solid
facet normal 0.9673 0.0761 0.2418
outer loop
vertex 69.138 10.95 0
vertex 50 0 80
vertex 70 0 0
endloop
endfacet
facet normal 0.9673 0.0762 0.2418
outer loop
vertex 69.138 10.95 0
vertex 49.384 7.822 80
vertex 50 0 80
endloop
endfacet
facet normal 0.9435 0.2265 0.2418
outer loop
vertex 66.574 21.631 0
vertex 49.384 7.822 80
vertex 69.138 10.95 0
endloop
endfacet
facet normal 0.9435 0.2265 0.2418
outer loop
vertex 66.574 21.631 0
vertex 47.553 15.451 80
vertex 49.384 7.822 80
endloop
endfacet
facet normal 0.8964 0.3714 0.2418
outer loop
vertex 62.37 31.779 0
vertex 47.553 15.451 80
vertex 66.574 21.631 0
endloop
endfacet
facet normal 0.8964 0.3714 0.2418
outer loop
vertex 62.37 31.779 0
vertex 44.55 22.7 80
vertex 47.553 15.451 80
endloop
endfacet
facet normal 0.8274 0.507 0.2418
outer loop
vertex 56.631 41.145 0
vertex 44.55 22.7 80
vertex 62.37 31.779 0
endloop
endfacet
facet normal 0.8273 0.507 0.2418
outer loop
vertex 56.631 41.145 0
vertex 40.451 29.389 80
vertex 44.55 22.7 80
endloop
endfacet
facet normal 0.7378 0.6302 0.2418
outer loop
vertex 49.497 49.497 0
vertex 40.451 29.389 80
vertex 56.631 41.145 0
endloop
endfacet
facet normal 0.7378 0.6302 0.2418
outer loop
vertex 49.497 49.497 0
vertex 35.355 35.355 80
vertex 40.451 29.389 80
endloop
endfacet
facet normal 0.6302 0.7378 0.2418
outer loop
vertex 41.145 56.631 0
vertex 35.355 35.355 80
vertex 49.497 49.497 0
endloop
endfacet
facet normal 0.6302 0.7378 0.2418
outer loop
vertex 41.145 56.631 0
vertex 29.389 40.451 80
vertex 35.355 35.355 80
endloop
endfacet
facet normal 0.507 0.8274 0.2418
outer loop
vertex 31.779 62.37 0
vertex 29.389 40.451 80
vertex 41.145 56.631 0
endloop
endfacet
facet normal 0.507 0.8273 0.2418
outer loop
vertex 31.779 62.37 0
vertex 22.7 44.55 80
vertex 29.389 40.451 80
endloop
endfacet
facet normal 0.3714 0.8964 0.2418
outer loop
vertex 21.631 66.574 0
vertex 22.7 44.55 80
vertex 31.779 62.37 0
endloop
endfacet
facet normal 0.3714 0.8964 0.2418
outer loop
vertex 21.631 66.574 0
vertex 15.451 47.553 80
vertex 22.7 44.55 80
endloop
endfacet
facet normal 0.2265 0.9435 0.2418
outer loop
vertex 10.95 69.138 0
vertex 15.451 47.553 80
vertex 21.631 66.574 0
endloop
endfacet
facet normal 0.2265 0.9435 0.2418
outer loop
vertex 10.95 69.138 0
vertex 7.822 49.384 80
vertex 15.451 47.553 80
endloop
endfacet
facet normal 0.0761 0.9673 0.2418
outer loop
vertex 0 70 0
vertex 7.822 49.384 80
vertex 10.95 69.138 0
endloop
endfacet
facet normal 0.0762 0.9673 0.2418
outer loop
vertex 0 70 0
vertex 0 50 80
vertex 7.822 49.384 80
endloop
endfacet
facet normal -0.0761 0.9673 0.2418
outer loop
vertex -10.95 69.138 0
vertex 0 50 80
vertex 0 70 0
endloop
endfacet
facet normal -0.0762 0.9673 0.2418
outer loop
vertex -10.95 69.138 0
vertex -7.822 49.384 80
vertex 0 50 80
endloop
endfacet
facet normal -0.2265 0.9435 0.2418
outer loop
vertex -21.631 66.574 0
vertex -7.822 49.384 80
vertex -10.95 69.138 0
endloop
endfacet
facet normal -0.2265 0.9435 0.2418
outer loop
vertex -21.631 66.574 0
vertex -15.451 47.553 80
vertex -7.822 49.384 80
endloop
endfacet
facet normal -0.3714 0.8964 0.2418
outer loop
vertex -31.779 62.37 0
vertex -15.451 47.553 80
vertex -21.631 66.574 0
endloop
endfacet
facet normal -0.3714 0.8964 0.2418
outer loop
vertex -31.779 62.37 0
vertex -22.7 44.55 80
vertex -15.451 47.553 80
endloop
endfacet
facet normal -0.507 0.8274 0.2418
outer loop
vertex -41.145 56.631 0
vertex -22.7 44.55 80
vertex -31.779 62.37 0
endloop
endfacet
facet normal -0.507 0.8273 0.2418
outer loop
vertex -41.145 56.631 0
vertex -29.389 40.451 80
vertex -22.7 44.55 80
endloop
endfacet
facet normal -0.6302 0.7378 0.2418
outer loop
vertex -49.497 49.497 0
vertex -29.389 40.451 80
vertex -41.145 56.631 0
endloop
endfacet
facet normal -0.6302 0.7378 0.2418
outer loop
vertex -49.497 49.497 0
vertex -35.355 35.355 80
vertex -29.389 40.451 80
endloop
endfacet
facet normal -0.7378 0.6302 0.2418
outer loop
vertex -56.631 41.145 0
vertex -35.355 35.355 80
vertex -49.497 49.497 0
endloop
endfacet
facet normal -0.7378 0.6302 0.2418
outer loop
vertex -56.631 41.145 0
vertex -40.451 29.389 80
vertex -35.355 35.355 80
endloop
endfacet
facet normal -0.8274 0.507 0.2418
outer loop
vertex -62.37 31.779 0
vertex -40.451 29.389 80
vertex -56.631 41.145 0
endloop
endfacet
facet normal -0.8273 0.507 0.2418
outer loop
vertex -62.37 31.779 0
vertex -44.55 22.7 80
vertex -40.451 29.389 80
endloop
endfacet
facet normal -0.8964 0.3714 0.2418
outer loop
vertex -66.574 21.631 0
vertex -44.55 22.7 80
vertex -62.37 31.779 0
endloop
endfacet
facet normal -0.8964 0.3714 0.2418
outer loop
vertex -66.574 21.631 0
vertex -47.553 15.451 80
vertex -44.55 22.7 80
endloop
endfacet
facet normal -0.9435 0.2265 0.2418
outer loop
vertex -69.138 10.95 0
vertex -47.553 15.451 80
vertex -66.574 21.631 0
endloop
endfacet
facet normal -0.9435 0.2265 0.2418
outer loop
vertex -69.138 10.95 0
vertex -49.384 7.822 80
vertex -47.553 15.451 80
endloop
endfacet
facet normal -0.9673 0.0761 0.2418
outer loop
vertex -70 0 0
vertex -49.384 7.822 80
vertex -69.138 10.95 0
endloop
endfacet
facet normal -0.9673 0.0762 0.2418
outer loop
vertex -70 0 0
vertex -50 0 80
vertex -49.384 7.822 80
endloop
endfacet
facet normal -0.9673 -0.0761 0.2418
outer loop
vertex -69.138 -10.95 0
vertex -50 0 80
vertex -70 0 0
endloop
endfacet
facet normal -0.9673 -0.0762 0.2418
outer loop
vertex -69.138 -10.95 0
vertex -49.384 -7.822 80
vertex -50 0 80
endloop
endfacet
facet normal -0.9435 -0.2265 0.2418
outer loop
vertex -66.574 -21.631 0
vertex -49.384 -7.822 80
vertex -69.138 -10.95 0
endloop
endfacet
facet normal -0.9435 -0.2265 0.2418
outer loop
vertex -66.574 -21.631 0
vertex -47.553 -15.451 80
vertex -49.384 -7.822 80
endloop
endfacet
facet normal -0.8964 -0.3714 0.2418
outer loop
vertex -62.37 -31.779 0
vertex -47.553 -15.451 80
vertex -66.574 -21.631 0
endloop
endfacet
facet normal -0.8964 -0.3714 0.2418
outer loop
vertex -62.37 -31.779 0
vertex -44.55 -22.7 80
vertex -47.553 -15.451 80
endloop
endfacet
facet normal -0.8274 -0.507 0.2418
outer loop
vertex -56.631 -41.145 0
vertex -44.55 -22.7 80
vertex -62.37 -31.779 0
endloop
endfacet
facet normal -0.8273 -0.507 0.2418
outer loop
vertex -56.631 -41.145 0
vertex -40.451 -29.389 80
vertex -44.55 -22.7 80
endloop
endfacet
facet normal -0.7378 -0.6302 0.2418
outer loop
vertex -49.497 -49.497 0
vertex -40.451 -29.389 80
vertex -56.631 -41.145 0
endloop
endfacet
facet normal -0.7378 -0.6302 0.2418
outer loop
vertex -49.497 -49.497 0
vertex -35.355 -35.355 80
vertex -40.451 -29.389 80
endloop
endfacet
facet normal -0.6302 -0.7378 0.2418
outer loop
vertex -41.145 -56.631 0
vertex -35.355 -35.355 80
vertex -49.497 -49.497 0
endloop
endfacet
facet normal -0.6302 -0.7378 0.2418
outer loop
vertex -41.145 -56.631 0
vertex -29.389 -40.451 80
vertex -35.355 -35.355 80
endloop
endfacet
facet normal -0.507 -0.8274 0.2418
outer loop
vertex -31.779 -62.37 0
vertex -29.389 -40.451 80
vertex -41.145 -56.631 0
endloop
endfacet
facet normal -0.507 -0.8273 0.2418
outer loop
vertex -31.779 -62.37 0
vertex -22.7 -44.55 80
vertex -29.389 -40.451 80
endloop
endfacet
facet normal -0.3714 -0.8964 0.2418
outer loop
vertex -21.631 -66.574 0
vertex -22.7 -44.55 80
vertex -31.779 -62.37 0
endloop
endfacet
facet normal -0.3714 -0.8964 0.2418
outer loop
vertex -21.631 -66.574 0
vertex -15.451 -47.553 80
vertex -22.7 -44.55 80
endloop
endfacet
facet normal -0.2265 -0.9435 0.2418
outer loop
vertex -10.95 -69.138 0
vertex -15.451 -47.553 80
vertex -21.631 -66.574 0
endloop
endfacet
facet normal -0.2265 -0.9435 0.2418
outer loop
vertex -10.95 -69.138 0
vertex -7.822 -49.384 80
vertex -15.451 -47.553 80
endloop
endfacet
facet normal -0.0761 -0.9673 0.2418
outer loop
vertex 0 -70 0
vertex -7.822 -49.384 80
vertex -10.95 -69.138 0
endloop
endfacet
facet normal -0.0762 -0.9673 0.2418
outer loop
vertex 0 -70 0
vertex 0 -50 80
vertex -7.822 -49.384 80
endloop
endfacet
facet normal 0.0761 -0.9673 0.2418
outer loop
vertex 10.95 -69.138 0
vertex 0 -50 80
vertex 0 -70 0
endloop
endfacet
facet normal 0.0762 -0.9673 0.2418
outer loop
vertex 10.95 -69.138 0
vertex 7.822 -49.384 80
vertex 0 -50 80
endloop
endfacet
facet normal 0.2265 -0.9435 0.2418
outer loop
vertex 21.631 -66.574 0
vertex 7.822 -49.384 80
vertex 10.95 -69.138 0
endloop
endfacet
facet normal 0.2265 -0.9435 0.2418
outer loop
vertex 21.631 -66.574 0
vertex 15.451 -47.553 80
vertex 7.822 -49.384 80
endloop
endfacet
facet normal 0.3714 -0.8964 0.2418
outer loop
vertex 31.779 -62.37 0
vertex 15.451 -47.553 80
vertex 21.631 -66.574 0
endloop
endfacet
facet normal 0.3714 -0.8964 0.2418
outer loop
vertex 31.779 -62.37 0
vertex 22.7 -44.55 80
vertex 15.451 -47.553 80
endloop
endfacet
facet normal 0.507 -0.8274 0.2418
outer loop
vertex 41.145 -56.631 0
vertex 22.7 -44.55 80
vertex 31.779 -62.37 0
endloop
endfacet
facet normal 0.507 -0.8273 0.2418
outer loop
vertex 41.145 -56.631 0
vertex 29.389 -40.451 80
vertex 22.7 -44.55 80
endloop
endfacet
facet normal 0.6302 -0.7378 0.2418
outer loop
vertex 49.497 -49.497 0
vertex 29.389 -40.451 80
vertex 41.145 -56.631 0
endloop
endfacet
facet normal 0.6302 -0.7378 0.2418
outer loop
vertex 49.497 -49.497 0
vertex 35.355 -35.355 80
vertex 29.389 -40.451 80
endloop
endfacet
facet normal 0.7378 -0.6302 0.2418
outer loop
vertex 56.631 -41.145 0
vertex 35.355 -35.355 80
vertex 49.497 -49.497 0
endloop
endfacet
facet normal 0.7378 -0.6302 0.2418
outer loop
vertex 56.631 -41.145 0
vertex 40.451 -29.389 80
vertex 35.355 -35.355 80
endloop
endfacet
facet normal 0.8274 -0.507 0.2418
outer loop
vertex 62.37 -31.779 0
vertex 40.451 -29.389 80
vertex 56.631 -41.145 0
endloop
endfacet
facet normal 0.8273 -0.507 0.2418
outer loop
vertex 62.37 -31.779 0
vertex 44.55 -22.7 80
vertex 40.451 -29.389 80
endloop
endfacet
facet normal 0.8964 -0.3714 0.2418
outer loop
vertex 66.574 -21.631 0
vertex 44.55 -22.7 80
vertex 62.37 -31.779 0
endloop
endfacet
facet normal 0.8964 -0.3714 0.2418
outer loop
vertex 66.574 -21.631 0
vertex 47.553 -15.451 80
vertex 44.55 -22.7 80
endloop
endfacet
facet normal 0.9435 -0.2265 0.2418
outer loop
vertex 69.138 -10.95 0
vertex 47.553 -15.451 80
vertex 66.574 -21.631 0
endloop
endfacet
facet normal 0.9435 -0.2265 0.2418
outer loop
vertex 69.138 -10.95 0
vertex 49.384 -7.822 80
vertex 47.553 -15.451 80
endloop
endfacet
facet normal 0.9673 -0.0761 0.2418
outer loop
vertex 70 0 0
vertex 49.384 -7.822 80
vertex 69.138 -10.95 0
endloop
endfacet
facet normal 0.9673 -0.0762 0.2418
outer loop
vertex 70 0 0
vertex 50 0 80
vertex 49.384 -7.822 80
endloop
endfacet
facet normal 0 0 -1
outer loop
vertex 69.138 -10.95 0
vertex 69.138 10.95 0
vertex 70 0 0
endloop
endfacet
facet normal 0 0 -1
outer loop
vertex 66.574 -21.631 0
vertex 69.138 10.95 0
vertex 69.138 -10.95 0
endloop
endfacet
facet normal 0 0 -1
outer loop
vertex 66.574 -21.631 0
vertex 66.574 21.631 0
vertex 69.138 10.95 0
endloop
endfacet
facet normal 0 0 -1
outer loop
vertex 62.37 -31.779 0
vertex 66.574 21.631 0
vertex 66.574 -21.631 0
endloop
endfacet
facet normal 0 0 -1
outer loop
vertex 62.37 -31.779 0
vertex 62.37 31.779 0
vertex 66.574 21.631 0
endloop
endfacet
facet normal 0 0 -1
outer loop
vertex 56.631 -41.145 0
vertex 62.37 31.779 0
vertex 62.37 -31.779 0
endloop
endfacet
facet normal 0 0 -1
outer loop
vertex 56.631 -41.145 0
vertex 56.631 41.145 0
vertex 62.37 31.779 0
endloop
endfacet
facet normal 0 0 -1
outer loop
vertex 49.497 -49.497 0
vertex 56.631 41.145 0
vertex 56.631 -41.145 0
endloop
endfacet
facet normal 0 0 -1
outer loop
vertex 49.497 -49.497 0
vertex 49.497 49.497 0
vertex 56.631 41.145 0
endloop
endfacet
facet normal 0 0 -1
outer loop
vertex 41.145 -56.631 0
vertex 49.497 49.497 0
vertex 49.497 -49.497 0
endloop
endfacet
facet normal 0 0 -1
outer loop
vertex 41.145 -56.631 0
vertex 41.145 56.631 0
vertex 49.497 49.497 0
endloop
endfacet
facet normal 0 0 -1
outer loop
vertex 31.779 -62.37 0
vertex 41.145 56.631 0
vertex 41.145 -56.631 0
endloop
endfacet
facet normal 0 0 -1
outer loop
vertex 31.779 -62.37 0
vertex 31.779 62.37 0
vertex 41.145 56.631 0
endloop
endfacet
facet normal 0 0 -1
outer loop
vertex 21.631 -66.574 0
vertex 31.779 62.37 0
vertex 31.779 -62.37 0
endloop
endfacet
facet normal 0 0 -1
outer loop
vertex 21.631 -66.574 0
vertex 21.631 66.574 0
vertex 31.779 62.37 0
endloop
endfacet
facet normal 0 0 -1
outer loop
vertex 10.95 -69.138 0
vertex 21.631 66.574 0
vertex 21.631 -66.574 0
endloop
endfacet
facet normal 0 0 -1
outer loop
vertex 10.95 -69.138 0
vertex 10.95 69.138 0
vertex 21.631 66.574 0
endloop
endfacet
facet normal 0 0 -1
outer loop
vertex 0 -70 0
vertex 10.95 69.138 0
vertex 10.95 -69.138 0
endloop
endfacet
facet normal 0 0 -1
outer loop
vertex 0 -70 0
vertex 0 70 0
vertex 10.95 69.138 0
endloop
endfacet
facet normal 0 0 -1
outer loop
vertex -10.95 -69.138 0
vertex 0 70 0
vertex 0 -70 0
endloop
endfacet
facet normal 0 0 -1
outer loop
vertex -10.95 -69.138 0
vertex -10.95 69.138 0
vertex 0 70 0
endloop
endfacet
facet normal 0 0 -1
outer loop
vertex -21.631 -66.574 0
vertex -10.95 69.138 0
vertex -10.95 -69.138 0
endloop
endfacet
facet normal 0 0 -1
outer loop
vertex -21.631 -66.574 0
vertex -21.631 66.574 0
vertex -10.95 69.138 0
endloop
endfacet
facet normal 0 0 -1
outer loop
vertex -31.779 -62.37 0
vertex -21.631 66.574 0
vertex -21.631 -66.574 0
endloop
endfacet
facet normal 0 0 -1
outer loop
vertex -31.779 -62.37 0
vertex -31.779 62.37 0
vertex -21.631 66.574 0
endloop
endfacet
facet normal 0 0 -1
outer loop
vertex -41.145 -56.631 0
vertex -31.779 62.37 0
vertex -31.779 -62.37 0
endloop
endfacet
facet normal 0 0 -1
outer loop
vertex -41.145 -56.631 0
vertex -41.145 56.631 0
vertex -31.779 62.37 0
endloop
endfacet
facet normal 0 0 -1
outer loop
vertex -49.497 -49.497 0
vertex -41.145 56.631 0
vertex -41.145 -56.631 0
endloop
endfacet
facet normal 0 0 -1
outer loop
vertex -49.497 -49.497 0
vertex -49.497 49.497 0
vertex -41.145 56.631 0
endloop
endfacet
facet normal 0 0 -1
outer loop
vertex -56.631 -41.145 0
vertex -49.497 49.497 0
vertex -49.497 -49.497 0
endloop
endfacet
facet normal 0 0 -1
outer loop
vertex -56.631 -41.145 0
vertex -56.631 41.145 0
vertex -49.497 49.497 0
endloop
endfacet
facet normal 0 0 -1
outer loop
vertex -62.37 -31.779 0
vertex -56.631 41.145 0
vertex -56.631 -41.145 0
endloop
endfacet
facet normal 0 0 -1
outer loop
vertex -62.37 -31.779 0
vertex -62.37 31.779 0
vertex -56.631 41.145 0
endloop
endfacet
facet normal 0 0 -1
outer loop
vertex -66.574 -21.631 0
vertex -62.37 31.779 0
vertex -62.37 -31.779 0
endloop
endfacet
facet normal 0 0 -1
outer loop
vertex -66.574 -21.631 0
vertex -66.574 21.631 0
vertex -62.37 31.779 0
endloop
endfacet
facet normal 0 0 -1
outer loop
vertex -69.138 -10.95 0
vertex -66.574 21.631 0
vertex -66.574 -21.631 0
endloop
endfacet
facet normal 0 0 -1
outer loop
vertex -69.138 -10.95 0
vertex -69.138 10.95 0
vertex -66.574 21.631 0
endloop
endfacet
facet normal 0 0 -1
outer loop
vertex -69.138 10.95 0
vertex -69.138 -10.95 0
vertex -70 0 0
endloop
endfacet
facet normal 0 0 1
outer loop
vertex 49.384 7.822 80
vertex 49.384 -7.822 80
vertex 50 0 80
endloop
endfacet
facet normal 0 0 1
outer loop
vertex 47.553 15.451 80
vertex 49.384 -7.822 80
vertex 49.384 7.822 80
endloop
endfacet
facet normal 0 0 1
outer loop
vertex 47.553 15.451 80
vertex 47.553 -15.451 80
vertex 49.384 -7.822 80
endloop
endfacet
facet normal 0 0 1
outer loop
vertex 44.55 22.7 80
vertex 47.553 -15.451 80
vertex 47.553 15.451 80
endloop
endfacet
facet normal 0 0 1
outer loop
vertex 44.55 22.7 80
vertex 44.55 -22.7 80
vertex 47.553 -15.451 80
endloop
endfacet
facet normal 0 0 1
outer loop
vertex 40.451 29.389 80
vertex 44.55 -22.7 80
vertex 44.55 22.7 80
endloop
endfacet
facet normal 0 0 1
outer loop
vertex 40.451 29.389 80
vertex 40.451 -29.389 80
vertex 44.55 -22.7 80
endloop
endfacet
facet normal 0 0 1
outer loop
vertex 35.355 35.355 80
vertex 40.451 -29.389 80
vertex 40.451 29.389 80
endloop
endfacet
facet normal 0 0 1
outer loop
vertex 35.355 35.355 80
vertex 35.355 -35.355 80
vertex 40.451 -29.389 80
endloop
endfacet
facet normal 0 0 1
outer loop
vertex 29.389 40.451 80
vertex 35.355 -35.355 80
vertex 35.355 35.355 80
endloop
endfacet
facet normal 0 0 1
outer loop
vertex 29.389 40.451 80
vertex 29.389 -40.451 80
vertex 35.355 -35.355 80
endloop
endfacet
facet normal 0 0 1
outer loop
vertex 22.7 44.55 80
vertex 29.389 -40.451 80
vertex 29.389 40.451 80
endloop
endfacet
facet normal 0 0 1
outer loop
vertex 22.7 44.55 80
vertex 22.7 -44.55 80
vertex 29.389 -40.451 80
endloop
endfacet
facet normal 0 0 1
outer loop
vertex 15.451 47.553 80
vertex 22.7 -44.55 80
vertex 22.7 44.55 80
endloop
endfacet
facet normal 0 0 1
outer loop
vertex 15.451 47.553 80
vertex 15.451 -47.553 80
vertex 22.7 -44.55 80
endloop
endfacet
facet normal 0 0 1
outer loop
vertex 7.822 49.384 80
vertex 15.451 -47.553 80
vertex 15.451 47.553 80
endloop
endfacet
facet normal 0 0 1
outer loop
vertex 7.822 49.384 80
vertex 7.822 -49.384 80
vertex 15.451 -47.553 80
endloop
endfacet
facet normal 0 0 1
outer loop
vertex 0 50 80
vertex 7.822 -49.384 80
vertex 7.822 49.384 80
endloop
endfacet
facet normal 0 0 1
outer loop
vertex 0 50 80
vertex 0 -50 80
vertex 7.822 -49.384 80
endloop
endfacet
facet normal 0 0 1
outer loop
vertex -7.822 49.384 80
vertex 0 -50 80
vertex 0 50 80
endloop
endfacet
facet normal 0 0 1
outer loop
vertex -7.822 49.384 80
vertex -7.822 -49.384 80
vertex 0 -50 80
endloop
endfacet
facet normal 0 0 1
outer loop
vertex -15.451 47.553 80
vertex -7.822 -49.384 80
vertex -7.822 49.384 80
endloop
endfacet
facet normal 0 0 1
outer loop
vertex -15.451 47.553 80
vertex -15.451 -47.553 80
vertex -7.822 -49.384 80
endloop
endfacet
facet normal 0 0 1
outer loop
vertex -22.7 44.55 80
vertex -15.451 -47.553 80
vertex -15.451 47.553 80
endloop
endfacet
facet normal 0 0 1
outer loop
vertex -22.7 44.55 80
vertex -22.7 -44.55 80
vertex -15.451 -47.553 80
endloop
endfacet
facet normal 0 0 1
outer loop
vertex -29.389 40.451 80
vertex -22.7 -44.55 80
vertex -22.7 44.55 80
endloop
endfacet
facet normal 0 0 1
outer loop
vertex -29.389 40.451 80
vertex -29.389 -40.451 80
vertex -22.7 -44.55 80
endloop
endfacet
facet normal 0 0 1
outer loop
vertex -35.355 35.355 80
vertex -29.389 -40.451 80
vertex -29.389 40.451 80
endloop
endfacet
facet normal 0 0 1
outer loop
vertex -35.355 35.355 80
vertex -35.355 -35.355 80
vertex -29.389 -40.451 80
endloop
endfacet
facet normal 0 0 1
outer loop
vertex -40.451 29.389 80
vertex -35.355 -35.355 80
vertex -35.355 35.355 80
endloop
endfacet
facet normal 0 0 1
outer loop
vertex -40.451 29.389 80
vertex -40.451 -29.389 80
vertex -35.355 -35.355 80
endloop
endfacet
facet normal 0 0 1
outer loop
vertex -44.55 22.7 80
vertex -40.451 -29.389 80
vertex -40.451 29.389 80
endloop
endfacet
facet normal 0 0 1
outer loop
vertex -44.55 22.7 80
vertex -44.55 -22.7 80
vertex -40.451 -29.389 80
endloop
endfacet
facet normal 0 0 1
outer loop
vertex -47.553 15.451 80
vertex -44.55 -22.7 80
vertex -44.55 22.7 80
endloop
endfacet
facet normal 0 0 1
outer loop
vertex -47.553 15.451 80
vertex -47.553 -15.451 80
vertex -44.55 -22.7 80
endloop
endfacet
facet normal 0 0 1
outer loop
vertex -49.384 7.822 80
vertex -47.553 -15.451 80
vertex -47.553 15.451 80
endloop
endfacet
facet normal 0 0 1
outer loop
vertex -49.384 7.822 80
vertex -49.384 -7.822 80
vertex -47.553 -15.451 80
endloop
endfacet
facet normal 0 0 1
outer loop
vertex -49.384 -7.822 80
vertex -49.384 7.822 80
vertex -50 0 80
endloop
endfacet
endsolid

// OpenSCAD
$fn = 40;

height = 80;
first_radius = 70;
second_radius = 50;


cylinder(height,first_radius, second_radius, center=false);
